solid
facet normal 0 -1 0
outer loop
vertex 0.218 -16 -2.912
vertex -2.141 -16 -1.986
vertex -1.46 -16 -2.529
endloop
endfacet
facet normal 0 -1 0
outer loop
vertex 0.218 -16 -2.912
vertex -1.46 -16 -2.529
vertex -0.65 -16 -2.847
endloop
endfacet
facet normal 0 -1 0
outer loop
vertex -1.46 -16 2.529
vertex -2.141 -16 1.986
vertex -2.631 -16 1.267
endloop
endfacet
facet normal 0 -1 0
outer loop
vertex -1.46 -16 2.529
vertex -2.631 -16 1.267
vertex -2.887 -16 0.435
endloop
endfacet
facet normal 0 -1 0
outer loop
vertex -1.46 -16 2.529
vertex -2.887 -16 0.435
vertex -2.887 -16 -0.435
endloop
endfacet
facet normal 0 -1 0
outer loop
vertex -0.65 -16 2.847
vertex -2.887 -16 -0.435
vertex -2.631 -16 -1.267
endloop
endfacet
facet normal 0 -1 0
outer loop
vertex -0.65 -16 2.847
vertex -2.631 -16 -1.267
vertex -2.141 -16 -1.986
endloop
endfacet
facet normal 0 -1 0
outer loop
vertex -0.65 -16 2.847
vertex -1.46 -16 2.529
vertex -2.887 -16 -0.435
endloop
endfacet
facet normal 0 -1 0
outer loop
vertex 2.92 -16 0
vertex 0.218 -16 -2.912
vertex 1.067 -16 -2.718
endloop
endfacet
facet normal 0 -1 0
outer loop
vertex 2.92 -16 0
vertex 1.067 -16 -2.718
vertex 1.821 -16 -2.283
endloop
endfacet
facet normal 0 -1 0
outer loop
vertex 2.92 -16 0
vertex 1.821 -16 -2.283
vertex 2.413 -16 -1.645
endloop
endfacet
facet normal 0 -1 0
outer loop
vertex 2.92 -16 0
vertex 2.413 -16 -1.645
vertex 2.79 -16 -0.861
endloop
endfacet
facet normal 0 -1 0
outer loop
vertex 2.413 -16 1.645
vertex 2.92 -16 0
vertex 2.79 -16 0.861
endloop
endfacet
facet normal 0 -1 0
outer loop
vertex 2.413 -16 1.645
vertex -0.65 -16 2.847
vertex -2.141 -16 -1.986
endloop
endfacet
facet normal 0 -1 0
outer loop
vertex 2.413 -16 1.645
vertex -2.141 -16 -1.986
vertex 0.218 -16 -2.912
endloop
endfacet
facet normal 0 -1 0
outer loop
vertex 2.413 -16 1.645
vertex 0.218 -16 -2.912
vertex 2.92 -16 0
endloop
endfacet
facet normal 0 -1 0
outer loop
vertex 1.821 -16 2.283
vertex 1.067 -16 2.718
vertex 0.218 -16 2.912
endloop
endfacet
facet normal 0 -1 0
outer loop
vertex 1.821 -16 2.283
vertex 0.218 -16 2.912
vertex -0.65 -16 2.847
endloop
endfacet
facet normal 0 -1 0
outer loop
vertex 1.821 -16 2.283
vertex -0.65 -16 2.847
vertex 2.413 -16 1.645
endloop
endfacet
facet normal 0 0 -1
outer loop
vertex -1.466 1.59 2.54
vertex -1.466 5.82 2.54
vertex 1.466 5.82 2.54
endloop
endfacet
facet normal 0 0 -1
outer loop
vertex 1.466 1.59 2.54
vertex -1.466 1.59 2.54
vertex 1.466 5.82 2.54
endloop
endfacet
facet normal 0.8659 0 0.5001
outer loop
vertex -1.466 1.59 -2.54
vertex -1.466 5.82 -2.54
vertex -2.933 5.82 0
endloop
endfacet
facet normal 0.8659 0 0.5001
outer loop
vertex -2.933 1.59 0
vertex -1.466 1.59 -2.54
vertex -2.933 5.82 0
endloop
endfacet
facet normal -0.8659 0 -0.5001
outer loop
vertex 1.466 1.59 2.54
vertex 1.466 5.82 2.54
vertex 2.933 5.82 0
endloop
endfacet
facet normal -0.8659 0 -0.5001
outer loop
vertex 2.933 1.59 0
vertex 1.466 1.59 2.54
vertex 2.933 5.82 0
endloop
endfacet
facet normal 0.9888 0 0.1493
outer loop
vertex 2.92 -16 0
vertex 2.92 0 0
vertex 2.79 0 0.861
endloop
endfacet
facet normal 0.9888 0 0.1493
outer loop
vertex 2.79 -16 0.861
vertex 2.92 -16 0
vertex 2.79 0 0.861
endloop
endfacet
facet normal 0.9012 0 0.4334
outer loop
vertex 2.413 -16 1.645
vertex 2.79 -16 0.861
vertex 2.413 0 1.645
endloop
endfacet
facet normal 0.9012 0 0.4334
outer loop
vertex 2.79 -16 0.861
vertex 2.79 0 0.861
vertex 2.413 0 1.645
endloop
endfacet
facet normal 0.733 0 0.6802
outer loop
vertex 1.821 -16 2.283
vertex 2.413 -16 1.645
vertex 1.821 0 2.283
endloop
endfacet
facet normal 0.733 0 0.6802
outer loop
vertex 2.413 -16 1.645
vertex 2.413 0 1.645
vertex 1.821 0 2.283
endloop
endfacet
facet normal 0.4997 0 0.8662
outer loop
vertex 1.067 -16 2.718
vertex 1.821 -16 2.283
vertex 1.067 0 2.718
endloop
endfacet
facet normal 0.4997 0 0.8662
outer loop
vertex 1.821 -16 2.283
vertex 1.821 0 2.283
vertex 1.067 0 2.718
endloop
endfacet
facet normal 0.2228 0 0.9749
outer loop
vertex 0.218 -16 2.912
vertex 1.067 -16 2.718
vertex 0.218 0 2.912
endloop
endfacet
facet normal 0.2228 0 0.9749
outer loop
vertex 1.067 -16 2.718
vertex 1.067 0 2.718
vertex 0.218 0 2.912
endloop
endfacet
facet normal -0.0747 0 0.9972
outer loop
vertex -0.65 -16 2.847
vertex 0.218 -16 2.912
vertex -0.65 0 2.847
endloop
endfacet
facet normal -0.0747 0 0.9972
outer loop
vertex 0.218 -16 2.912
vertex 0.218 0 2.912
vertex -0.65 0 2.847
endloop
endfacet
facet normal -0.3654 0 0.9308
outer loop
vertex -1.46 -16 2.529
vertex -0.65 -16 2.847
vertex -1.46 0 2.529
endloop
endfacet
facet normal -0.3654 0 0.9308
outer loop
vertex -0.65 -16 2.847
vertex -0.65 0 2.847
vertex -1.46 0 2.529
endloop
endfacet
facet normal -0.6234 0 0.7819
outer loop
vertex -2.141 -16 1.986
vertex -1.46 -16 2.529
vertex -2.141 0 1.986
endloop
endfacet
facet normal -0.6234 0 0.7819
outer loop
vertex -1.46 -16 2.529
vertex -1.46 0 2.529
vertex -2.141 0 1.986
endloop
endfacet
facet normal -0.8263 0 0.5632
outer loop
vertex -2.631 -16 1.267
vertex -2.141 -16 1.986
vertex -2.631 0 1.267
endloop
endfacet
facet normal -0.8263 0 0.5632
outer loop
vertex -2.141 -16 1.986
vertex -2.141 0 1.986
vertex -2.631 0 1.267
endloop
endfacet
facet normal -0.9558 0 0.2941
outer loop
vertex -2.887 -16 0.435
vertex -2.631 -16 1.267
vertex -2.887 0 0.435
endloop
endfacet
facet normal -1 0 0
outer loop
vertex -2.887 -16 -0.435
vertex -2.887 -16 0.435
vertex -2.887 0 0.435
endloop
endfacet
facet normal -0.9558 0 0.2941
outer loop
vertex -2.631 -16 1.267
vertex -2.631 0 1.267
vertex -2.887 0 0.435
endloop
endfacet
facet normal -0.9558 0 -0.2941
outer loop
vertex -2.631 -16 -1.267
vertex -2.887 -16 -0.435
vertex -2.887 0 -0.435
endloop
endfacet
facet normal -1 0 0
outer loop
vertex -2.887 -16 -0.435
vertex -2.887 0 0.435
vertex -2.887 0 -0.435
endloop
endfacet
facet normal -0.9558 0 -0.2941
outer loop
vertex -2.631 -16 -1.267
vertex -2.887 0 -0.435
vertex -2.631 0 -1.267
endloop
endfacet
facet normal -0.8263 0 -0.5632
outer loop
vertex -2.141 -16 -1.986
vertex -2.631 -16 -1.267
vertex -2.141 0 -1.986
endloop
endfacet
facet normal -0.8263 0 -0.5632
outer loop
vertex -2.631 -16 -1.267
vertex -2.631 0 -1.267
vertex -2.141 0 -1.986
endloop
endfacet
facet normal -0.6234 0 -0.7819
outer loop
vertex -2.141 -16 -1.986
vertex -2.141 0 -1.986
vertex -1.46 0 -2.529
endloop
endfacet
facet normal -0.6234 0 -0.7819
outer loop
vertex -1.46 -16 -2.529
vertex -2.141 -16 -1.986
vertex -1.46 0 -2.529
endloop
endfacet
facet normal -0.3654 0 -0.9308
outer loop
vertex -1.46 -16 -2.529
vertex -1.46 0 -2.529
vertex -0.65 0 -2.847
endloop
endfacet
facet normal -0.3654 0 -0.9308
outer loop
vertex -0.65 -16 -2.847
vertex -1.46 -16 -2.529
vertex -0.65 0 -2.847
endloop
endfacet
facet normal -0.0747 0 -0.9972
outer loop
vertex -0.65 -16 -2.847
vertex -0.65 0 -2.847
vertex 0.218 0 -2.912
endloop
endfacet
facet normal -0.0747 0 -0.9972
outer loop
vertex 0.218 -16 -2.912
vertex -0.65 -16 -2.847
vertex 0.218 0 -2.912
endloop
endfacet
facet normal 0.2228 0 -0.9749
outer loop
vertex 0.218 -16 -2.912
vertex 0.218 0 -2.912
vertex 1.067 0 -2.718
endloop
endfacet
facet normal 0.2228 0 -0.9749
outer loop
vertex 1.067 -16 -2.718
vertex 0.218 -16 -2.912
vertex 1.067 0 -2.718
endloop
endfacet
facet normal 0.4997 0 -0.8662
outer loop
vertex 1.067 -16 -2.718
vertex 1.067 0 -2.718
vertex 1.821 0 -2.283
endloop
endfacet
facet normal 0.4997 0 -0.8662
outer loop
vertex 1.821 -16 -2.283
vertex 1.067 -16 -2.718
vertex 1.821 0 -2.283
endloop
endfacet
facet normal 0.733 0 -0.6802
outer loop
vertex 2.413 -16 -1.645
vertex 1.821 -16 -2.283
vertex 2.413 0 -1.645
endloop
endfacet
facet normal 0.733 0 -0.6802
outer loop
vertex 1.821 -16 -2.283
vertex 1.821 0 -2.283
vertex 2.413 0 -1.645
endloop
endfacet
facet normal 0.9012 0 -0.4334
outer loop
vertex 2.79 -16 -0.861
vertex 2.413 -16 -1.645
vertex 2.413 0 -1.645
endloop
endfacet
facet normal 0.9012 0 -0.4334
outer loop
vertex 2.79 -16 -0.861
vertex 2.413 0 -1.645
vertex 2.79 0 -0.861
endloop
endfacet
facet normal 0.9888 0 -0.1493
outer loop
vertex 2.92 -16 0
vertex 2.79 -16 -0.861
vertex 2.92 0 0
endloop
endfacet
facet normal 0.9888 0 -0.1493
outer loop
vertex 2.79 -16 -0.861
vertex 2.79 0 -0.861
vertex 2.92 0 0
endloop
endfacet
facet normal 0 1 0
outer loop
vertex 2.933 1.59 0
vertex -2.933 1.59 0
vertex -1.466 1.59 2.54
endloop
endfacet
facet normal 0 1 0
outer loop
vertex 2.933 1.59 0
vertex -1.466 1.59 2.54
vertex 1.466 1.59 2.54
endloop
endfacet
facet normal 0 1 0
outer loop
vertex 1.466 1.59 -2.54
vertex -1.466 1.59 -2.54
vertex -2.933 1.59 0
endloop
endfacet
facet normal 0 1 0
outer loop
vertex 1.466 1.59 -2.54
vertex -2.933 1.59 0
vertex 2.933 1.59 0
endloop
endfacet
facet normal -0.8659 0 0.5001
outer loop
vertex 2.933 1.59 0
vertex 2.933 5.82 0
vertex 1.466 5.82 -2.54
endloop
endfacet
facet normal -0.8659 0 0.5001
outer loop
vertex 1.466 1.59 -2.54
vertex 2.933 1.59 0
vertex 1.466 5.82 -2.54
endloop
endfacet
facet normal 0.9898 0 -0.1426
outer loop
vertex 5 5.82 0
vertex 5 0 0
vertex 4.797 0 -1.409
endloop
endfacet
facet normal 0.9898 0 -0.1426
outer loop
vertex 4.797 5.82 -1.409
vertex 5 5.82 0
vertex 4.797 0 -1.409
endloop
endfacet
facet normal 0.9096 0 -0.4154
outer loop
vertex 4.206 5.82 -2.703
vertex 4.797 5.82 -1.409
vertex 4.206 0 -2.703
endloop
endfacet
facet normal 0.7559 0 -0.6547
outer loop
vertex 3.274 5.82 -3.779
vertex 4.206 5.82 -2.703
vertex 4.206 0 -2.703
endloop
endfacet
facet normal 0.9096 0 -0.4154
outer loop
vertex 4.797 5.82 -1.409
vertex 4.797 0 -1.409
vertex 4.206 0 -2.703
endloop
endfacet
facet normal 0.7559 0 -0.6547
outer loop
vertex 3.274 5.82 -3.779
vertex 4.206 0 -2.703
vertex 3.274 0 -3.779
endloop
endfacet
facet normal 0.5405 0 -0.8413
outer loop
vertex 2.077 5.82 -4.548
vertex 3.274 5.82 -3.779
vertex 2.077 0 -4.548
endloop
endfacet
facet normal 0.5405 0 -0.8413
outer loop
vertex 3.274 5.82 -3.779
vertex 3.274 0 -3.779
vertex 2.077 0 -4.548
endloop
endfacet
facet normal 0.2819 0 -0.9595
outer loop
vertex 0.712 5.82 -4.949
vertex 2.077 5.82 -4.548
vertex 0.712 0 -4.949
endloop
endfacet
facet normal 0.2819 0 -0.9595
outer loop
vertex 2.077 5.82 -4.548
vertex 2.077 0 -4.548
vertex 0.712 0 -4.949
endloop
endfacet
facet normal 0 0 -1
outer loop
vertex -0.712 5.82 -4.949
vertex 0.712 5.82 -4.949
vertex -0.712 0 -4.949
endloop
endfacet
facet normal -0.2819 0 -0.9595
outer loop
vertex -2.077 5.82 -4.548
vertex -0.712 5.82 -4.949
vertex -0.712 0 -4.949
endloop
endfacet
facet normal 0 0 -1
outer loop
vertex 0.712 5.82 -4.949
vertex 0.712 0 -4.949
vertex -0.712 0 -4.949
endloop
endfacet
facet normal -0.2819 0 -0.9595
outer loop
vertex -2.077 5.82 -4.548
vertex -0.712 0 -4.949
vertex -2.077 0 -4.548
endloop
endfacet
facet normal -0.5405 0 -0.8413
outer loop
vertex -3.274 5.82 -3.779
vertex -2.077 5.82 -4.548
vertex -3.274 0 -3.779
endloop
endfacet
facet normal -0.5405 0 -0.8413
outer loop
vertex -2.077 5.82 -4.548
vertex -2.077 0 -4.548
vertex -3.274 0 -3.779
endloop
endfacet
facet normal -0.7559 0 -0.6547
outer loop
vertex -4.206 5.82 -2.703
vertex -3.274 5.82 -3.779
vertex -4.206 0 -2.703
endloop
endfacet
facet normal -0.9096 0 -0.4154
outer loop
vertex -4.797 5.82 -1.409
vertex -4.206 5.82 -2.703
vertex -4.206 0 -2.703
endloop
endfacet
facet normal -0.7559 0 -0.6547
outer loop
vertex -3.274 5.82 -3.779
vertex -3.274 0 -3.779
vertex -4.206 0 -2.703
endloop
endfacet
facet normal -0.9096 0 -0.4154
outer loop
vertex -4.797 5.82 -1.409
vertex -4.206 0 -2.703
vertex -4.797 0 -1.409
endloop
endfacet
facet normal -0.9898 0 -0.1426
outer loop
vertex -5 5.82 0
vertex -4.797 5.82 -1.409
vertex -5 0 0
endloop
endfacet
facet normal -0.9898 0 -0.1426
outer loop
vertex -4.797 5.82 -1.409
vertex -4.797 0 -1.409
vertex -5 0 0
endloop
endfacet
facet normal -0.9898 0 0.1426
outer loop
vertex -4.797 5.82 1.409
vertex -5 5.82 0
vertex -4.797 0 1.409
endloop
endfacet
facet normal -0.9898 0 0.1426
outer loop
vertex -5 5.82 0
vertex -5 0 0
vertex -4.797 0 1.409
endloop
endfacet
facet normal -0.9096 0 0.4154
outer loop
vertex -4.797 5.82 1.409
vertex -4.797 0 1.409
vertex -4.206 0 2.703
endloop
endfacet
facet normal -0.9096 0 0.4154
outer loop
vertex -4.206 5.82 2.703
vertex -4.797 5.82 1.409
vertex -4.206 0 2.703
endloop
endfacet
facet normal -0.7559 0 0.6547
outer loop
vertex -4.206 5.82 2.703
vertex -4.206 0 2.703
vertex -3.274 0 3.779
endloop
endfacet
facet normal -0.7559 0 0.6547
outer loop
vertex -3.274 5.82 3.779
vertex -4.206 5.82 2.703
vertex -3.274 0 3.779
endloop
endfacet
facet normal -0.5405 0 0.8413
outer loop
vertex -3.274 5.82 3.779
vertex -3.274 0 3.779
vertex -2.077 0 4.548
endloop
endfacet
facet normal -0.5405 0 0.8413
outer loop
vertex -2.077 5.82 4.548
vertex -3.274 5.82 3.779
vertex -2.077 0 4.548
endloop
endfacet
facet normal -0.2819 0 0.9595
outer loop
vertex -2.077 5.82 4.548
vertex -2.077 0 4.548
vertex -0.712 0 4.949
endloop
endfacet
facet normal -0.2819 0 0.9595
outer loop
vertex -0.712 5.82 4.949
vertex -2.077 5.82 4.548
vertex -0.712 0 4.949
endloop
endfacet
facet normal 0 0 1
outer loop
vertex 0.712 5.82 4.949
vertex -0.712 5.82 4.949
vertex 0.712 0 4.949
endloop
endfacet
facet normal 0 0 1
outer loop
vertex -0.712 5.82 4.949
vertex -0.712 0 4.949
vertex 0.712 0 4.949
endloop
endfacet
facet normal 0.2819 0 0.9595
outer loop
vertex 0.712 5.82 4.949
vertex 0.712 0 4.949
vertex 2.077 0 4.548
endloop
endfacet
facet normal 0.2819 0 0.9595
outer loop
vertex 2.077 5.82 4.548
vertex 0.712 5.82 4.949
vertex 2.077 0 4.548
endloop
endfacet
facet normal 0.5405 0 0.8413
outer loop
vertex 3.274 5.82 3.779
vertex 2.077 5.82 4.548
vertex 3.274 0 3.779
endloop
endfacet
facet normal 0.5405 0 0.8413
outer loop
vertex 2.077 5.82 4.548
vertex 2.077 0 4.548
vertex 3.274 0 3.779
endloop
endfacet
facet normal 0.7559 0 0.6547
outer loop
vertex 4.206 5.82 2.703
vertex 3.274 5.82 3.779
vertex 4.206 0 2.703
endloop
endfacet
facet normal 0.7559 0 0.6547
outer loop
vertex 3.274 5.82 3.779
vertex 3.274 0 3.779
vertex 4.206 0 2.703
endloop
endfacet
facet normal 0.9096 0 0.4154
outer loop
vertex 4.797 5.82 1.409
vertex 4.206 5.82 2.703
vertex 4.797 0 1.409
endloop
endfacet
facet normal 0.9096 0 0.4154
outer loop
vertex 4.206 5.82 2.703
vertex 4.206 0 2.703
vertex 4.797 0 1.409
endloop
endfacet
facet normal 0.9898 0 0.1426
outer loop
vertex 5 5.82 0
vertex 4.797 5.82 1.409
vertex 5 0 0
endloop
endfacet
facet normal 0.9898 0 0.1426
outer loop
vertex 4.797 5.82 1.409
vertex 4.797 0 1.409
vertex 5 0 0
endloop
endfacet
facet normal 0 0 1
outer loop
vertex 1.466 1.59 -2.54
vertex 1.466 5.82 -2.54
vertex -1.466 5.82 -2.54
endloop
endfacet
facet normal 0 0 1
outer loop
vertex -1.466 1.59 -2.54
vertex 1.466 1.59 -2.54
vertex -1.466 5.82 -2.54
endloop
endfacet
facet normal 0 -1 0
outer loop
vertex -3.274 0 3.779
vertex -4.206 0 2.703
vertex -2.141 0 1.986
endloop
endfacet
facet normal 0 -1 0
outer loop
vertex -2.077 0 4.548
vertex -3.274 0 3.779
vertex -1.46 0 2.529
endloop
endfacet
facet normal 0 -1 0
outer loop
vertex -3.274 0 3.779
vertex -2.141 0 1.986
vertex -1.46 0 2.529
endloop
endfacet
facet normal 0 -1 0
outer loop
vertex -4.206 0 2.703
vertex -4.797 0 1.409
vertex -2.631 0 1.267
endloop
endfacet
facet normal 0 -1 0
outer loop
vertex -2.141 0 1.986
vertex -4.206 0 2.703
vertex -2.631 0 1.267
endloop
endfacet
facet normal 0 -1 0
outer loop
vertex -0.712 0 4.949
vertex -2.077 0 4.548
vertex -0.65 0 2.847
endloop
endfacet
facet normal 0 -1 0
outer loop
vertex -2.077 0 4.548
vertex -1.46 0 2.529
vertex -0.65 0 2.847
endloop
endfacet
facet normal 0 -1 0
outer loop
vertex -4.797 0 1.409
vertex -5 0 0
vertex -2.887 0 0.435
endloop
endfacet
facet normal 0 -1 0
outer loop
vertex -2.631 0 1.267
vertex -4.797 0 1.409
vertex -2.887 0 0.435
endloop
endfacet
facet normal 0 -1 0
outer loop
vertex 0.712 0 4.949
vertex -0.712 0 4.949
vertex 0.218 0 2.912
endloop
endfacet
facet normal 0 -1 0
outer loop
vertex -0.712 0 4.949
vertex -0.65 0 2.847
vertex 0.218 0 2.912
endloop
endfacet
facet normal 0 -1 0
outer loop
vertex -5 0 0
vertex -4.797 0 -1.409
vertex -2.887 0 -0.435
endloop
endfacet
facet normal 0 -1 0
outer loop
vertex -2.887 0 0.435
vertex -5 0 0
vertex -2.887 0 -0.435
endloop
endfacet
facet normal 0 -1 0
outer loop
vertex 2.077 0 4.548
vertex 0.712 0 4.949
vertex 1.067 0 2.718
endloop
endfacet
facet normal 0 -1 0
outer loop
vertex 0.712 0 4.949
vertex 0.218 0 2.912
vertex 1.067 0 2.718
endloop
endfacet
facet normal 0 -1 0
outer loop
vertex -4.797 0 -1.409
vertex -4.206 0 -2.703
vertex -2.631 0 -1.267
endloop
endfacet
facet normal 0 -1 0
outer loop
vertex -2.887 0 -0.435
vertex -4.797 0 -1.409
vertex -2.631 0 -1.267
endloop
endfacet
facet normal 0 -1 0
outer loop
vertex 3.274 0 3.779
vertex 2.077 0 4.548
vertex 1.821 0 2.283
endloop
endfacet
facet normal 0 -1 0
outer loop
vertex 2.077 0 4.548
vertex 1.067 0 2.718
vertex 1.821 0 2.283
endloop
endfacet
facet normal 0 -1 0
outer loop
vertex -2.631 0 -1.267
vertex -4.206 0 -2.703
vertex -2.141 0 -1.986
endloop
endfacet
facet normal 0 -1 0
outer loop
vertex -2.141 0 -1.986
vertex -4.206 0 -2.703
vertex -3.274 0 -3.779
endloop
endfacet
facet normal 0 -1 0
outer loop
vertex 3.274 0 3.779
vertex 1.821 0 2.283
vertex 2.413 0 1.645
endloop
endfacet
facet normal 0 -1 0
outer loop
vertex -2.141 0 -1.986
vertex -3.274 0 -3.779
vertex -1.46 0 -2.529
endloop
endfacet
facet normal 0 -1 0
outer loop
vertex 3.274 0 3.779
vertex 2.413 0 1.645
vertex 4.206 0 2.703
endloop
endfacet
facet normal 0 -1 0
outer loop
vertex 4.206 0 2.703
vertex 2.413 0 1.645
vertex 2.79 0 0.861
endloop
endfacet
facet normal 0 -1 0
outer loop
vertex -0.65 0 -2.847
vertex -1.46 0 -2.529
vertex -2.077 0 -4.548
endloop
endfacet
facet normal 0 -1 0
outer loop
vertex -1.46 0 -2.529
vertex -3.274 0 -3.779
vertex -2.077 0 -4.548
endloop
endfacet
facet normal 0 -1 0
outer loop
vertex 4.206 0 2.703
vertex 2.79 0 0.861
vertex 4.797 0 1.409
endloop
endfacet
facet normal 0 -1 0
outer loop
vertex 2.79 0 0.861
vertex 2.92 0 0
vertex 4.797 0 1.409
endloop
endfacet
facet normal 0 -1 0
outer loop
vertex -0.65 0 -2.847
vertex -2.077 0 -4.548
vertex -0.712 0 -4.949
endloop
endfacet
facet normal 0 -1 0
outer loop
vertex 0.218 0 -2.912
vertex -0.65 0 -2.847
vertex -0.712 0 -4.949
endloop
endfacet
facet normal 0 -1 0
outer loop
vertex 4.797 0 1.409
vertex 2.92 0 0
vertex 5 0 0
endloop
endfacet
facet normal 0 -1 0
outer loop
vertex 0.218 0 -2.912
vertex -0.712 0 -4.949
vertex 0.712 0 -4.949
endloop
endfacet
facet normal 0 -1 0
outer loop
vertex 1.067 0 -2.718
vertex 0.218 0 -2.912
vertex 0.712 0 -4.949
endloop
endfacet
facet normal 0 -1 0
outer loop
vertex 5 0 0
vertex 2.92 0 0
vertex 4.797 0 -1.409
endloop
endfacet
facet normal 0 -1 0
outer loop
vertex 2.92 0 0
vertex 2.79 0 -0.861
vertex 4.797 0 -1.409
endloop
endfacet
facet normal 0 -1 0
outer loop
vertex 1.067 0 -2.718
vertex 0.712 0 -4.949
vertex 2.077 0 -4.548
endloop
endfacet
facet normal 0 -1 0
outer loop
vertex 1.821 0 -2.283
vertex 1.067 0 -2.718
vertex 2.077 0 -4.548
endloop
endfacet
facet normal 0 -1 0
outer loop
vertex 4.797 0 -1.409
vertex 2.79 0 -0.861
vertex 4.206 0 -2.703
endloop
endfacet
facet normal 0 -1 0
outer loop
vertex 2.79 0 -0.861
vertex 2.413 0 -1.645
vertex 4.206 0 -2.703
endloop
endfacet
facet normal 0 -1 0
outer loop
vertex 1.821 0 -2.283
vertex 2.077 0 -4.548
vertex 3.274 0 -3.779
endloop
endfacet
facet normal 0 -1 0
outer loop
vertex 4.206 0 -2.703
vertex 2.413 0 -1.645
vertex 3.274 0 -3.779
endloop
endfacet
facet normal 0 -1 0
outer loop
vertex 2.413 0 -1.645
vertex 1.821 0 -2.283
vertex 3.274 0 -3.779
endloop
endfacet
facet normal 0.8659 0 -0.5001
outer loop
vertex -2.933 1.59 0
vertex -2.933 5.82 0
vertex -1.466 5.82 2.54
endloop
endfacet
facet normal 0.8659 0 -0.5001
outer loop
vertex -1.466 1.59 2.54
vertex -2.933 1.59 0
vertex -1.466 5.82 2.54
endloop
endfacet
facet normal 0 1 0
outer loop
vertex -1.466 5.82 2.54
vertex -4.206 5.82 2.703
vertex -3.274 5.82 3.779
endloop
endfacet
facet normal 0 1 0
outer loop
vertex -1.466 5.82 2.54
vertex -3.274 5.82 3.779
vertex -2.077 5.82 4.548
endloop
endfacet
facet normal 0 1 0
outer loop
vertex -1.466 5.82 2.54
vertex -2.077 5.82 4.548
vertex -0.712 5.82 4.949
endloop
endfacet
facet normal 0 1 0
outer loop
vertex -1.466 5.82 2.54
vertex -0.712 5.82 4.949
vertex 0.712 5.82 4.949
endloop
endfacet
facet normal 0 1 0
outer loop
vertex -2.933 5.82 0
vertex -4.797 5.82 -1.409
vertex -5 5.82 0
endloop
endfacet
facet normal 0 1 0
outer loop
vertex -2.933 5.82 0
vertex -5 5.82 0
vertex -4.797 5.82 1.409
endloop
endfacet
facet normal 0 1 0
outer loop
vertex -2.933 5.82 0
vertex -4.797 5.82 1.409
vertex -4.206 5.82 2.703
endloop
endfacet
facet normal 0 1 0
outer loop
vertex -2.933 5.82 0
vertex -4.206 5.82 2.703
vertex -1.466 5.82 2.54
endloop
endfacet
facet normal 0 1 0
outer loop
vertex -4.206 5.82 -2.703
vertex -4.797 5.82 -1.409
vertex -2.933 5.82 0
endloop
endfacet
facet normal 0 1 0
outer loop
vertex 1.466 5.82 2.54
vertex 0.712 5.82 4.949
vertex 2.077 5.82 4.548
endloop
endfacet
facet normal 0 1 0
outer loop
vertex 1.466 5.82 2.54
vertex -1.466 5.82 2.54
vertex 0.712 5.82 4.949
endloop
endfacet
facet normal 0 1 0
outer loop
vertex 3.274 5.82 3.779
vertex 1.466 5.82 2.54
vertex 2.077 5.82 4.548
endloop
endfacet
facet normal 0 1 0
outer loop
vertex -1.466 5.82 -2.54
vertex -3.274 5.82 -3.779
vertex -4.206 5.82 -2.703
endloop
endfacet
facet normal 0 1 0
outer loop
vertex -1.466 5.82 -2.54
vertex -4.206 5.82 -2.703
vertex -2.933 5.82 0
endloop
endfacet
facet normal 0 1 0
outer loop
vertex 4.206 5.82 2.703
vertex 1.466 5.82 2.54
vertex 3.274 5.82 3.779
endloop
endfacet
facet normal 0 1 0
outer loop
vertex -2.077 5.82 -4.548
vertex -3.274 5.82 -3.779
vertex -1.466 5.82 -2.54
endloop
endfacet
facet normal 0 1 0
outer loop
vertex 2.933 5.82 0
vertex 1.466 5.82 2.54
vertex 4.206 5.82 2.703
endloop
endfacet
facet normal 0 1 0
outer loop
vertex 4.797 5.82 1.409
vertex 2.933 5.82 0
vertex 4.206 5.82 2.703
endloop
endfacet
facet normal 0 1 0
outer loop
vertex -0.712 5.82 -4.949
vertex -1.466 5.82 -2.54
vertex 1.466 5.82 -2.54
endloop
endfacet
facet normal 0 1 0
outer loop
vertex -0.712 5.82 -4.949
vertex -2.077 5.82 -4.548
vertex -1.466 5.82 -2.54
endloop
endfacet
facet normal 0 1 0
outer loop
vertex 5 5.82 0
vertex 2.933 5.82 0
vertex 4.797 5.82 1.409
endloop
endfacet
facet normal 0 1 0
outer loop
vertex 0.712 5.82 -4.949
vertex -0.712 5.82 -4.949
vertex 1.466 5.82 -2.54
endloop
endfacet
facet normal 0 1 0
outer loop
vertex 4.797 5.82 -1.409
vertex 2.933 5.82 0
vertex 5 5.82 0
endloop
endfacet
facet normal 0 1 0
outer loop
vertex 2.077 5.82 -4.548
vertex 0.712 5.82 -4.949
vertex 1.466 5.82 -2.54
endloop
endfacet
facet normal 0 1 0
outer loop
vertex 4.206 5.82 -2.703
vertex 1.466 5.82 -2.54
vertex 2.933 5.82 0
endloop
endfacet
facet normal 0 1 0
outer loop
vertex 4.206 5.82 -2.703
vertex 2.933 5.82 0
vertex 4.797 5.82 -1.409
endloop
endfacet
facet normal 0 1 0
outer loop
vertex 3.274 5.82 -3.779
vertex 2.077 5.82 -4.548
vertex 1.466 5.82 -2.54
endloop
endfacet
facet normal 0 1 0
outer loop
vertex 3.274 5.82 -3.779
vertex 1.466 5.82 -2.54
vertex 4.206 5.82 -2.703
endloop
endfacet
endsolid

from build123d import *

# Parameters (mm, degrees)
SKETCH1_R           = 5
BOSS_EXTRUDE1_DEPTH = 5.82
SKETCH2_R           = 2.92
BOSS_EXTRUDE2_DEPTH = 16
CUT_EXTRUDE1_DEPTH  = 4.23


with BuildPart() as part:
    # Sketch1 → Boss-Extrude1 (new body)
    with BuildSketch(Plane(origin=(0, 0, 0), x_dir=(1, 0, 0), z_dir=(0, 1, 0))):
        Circle(SKETCH1_R)
    extrude(amount=BOSS_EXTRUDE1_DEPTH)

    # Sketch2 → Boss-Extrude2 (add)
    with BuildSketch(Plane.XZ):
        Circle(SKETCH2_R)
    extrude(amount=BOSS_EXTRUDE2_DEPTH)

    # Sketch3 → Cut-Extrude1 (cut)
    with BuildSketch(Plane(origin=(0, 5.82, 0), x_dir=(1, 0, 0), z_dir=(0, 1, 0))):
        Polygon((2.932939367, 0), (1.466469684, 2.54), (-1.466469684, 2.54), (-2.932939367, 0), (-1.466469684, -2.54), (1.466469684, -2.54), align=None)
    extrude(amount=-CUT_EXTRUDE1_DEPTH, mode=Mode.SUBTRACT)


solid = part.part
